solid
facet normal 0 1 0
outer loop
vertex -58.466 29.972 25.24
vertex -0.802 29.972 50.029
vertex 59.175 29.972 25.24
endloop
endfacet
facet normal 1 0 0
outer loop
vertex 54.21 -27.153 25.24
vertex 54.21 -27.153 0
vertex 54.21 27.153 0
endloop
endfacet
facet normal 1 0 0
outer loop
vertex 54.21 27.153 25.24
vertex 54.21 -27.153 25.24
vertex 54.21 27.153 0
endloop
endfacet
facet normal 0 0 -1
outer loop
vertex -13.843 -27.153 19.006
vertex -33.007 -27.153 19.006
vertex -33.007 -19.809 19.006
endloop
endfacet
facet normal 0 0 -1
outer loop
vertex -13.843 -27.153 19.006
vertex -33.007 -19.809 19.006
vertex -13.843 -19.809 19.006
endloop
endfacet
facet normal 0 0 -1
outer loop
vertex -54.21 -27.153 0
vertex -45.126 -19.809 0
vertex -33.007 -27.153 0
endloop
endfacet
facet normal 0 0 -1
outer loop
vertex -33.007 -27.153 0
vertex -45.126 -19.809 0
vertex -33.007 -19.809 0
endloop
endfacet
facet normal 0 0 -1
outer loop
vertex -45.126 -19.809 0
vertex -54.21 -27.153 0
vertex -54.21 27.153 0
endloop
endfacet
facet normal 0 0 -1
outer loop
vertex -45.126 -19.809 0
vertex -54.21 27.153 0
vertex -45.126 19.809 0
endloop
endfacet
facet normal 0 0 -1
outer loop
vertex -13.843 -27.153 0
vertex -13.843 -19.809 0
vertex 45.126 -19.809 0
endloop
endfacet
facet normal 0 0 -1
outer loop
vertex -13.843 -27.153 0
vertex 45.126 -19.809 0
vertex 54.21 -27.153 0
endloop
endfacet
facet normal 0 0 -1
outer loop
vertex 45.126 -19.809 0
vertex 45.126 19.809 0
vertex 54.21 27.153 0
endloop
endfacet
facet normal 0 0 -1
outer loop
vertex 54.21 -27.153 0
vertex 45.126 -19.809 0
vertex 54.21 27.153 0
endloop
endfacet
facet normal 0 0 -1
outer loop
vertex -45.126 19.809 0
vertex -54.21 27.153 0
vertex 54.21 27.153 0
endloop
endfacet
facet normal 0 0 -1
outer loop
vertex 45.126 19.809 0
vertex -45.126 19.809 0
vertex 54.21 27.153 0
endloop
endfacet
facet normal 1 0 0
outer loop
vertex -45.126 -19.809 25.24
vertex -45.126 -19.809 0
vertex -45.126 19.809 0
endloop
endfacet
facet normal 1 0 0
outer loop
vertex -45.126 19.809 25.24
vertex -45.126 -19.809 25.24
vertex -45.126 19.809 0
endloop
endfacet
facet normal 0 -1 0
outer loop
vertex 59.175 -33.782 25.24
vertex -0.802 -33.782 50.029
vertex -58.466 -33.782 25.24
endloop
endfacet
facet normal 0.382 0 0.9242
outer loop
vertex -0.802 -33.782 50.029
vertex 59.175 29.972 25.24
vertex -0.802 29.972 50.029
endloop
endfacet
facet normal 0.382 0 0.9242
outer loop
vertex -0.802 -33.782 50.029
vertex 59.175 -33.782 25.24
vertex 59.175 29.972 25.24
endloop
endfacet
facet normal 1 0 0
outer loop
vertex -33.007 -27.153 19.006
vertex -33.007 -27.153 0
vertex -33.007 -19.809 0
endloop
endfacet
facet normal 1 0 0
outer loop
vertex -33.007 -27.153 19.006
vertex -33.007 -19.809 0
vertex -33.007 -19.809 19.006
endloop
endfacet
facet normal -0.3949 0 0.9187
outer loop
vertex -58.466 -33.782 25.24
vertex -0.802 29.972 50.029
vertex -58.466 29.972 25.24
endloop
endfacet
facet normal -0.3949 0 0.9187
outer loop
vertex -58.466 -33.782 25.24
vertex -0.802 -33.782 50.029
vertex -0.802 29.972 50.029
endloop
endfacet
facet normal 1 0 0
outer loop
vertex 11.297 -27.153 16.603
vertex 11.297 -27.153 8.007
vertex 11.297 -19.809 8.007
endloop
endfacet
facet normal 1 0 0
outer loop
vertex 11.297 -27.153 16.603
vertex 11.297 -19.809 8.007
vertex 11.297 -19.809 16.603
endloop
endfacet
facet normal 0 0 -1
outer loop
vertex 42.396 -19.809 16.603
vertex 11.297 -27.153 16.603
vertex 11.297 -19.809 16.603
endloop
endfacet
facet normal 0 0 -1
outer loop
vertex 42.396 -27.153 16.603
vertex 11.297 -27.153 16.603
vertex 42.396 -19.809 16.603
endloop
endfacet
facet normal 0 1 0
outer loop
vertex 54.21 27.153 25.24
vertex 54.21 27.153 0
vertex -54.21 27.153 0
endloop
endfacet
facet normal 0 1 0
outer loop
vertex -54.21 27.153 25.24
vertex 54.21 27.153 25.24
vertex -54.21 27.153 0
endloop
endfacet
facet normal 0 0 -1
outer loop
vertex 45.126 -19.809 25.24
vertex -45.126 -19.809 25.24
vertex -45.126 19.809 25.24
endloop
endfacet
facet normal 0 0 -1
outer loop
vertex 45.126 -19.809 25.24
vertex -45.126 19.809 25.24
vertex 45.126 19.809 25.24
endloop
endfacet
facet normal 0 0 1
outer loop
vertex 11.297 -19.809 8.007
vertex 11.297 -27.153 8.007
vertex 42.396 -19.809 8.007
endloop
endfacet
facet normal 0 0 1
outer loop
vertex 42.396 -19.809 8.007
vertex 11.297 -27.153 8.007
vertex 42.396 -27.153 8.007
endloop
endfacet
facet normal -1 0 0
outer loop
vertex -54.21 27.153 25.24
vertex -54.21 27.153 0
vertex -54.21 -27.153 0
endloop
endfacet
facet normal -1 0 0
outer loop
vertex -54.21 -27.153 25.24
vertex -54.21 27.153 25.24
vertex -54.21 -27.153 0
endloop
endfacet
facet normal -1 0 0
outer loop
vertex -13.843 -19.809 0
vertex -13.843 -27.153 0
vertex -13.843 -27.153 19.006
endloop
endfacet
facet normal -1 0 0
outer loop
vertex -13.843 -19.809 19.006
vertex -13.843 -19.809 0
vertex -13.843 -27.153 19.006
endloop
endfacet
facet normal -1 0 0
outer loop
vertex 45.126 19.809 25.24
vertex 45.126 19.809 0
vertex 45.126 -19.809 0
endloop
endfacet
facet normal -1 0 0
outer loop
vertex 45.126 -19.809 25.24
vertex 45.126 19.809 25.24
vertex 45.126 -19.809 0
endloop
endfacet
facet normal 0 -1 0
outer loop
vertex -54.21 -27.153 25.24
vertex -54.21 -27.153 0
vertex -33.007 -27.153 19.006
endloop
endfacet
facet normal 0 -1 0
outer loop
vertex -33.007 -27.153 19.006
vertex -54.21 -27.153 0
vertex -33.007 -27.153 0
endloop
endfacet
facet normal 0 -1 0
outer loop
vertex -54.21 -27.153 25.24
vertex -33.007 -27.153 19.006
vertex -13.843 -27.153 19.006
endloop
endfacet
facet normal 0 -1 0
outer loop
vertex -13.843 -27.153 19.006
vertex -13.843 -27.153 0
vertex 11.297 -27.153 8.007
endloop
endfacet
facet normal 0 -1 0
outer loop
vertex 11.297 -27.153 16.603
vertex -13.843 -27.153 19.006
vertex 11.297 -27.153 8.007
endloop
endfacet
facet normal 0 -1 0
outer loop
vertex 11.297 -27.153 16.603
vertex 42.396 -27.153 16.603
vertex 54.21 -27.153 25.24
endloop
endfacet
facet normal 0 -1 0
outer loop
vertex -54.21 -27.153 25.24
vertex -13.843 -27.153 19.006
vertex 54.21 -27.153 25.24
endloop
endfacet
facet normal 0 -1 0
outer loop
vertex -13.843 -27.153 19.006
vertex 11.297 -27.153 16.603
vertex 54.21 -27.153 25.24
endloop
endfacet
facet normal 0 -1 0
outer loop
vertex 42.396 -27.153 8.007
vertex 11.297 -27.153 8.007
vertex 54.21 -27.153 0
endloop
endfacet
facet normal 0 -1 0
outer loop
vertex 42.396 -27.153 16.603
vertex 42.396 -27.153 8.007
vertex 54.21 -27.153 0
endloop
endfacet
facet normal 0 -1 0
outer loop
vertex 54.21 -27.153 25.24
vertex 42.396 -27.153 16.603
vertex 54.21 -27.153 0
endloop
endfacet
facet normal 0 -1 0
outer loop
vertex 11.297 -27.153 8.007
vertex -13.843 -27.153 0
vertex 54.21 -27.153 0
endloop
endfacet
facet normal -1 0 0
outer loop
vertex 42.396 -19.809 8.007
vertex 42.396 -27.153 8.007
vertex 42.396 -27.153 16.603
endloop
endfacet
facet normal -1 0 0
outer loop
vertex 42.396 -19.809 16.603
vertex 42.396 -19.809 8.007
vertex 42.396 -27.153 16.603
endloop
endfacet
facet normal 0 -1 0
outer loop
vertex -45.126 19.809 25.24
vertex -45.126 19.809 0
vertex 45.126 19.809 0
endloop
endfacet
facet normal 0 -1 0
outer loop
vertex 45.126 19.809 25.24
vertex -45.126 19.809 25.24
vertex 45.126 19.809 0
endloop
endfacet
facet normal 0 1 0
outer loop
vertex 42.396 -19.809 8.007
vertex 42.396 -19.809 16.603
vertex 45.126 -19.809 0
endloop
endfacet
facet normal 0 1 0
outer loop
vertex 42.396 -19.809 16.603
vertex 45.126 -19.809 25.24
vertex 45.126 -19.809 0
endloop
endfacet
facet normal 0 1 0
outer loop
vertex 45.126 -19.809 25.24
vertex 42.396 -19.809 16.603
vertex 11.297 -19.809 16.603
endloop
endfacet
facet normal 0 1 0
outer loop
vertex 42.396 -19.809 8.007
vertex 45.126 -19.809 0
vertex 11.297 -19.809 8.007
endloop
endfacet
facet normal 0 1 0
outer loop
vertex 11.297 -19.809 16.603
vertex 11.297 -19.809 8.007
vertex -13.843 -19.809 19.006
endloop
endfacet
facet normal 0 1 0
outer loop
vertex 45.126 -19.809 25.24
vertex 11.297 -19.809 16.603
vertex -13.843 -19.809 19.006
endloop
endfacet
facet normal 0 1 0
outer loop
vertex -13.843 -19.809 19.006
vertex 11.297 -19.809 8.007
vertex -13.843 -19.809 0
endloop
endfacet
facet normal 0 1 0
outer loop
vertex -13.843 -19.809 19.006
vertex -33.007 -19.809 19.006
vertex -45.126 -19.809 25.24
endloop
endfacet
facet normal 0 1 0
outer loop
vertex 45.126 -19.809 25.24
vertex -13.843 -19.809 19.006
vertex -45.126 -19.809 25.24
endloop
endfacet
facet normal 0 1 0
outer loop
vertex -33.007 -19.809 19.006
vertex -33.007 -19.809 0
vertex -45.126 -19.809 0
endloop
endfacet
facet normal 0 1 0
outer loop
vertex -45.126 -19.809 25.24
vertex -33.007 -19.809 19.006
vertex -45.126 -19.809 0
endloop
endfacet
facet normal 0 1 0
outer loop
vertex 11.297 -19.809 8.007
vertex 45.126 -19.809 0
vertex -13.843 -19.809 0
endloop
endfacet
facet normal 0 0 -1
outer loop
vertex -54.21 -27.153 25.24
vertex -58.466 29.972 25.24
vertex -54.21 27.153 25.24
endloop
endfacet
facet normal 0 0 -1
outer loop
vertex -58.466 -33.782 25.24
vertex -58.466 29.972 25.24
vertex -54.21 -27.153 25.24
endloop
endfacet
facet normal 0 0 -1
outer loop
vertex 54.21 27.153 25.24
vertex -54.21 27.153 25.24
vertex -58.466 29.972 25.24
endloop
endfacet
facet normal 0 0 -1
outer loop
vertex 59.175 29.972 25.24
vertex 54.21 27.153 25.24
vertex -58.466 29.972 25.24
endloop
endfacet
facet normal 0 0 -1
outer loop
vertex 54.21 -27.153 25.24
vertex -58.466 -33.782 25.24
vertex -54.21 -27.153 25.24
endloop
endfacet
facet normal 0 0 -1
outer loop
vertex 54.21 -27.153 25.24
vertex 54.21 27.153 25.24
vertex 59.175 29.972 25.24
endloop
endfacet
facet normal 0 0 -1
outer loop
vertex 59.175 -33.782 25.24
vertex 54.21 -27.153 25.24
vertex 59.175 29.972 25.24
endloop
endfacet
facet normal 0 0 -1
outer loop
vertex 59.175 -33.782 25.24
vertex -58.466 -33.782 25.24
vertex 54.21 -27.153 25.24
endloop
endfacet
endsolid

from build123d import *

# Parameters (mm, degrees)
F0_W          = 17.715182
F0_H          = 7.343914
F1_DEPTH      = 25.4
F2_W          = 19.163959
F2_H          = 19.005526
F3_DEPTH      = 7.343914
F4_W          = 25.703696
F4_H          = 10.242827
F5_DEPTH      = 7.343914
F6_W          = 31.09887
F6_H          = 8.596847
F7_DEPTH      = 7.343914
F9_DEPTH      = 33.782
F9_DEPTH_BACK = 29.972


with BuildPart() as f1:
    # F0 (on Top) → F1 (new body)
    with BuildSketch(Plane.XY):
        with Locations((-19.371394, 23.481196)):
            Rectangle(F0_W, F0_H)
        Polygon((-45.126412, -19.809239), (-45.126412, 19.809239), (-28.228985, 19.809239), (-28.228985, 27.153153), (-54.209676, 27.153153), (-54.209676, -27.153153), (54.209676, -27.153153), (54.209676, 27.153153), (-10.513803, 27.153153), (-10.513803, 19.809239), (45.126412, 19.809239), (45.126412, -19.809239), align=None)
    extrude(amount=F1_DEPTH)

    # F2 (on face) → F3 (cut, through all)
    with BuildSketch(Plane.XZ.offset(27.153153)):
        with Locations((-23.425042, 9.502763)):
            Rectangle(F2_W, F2_H)
    extrude(amount=-F3_DEPTH, mode=Mode.SUBTRACT)

    # F4 (on face) → F5 (join, through all)
    with BuildSketch(Plane.XZ.offset(27.153153)):
        with Locations((27.443045, 12.561957)):
            Rectangle(F4_W, F4_H)
    extrude(amount=-F5_DEPTH)

    # F6 (on face) → F7 (cut, through all)
    with BuildSketch(Plane.XZ.offset(27.153153)):
        with Locations((26.846507, 12.30497)):
            Rectangle(F6_W, F6_H)
    extrude(amount=-F7_DEPTH, mode=Mode.SUBTRACT)

    # F8 (on Front) → F9 (join, two sides)
    with BuildSketch(Plane.XZ) as f9_sk:
        Polygon((-0.802159, 50.028846), (-58.465718, 25.240492), (59.17522, 25.240492), align=None)
    extrude(amount=F9_DEPTH)
    extrude(f9_sk.sketch, amount=-F9_DEPTH_BACK)


solid = f1.part
